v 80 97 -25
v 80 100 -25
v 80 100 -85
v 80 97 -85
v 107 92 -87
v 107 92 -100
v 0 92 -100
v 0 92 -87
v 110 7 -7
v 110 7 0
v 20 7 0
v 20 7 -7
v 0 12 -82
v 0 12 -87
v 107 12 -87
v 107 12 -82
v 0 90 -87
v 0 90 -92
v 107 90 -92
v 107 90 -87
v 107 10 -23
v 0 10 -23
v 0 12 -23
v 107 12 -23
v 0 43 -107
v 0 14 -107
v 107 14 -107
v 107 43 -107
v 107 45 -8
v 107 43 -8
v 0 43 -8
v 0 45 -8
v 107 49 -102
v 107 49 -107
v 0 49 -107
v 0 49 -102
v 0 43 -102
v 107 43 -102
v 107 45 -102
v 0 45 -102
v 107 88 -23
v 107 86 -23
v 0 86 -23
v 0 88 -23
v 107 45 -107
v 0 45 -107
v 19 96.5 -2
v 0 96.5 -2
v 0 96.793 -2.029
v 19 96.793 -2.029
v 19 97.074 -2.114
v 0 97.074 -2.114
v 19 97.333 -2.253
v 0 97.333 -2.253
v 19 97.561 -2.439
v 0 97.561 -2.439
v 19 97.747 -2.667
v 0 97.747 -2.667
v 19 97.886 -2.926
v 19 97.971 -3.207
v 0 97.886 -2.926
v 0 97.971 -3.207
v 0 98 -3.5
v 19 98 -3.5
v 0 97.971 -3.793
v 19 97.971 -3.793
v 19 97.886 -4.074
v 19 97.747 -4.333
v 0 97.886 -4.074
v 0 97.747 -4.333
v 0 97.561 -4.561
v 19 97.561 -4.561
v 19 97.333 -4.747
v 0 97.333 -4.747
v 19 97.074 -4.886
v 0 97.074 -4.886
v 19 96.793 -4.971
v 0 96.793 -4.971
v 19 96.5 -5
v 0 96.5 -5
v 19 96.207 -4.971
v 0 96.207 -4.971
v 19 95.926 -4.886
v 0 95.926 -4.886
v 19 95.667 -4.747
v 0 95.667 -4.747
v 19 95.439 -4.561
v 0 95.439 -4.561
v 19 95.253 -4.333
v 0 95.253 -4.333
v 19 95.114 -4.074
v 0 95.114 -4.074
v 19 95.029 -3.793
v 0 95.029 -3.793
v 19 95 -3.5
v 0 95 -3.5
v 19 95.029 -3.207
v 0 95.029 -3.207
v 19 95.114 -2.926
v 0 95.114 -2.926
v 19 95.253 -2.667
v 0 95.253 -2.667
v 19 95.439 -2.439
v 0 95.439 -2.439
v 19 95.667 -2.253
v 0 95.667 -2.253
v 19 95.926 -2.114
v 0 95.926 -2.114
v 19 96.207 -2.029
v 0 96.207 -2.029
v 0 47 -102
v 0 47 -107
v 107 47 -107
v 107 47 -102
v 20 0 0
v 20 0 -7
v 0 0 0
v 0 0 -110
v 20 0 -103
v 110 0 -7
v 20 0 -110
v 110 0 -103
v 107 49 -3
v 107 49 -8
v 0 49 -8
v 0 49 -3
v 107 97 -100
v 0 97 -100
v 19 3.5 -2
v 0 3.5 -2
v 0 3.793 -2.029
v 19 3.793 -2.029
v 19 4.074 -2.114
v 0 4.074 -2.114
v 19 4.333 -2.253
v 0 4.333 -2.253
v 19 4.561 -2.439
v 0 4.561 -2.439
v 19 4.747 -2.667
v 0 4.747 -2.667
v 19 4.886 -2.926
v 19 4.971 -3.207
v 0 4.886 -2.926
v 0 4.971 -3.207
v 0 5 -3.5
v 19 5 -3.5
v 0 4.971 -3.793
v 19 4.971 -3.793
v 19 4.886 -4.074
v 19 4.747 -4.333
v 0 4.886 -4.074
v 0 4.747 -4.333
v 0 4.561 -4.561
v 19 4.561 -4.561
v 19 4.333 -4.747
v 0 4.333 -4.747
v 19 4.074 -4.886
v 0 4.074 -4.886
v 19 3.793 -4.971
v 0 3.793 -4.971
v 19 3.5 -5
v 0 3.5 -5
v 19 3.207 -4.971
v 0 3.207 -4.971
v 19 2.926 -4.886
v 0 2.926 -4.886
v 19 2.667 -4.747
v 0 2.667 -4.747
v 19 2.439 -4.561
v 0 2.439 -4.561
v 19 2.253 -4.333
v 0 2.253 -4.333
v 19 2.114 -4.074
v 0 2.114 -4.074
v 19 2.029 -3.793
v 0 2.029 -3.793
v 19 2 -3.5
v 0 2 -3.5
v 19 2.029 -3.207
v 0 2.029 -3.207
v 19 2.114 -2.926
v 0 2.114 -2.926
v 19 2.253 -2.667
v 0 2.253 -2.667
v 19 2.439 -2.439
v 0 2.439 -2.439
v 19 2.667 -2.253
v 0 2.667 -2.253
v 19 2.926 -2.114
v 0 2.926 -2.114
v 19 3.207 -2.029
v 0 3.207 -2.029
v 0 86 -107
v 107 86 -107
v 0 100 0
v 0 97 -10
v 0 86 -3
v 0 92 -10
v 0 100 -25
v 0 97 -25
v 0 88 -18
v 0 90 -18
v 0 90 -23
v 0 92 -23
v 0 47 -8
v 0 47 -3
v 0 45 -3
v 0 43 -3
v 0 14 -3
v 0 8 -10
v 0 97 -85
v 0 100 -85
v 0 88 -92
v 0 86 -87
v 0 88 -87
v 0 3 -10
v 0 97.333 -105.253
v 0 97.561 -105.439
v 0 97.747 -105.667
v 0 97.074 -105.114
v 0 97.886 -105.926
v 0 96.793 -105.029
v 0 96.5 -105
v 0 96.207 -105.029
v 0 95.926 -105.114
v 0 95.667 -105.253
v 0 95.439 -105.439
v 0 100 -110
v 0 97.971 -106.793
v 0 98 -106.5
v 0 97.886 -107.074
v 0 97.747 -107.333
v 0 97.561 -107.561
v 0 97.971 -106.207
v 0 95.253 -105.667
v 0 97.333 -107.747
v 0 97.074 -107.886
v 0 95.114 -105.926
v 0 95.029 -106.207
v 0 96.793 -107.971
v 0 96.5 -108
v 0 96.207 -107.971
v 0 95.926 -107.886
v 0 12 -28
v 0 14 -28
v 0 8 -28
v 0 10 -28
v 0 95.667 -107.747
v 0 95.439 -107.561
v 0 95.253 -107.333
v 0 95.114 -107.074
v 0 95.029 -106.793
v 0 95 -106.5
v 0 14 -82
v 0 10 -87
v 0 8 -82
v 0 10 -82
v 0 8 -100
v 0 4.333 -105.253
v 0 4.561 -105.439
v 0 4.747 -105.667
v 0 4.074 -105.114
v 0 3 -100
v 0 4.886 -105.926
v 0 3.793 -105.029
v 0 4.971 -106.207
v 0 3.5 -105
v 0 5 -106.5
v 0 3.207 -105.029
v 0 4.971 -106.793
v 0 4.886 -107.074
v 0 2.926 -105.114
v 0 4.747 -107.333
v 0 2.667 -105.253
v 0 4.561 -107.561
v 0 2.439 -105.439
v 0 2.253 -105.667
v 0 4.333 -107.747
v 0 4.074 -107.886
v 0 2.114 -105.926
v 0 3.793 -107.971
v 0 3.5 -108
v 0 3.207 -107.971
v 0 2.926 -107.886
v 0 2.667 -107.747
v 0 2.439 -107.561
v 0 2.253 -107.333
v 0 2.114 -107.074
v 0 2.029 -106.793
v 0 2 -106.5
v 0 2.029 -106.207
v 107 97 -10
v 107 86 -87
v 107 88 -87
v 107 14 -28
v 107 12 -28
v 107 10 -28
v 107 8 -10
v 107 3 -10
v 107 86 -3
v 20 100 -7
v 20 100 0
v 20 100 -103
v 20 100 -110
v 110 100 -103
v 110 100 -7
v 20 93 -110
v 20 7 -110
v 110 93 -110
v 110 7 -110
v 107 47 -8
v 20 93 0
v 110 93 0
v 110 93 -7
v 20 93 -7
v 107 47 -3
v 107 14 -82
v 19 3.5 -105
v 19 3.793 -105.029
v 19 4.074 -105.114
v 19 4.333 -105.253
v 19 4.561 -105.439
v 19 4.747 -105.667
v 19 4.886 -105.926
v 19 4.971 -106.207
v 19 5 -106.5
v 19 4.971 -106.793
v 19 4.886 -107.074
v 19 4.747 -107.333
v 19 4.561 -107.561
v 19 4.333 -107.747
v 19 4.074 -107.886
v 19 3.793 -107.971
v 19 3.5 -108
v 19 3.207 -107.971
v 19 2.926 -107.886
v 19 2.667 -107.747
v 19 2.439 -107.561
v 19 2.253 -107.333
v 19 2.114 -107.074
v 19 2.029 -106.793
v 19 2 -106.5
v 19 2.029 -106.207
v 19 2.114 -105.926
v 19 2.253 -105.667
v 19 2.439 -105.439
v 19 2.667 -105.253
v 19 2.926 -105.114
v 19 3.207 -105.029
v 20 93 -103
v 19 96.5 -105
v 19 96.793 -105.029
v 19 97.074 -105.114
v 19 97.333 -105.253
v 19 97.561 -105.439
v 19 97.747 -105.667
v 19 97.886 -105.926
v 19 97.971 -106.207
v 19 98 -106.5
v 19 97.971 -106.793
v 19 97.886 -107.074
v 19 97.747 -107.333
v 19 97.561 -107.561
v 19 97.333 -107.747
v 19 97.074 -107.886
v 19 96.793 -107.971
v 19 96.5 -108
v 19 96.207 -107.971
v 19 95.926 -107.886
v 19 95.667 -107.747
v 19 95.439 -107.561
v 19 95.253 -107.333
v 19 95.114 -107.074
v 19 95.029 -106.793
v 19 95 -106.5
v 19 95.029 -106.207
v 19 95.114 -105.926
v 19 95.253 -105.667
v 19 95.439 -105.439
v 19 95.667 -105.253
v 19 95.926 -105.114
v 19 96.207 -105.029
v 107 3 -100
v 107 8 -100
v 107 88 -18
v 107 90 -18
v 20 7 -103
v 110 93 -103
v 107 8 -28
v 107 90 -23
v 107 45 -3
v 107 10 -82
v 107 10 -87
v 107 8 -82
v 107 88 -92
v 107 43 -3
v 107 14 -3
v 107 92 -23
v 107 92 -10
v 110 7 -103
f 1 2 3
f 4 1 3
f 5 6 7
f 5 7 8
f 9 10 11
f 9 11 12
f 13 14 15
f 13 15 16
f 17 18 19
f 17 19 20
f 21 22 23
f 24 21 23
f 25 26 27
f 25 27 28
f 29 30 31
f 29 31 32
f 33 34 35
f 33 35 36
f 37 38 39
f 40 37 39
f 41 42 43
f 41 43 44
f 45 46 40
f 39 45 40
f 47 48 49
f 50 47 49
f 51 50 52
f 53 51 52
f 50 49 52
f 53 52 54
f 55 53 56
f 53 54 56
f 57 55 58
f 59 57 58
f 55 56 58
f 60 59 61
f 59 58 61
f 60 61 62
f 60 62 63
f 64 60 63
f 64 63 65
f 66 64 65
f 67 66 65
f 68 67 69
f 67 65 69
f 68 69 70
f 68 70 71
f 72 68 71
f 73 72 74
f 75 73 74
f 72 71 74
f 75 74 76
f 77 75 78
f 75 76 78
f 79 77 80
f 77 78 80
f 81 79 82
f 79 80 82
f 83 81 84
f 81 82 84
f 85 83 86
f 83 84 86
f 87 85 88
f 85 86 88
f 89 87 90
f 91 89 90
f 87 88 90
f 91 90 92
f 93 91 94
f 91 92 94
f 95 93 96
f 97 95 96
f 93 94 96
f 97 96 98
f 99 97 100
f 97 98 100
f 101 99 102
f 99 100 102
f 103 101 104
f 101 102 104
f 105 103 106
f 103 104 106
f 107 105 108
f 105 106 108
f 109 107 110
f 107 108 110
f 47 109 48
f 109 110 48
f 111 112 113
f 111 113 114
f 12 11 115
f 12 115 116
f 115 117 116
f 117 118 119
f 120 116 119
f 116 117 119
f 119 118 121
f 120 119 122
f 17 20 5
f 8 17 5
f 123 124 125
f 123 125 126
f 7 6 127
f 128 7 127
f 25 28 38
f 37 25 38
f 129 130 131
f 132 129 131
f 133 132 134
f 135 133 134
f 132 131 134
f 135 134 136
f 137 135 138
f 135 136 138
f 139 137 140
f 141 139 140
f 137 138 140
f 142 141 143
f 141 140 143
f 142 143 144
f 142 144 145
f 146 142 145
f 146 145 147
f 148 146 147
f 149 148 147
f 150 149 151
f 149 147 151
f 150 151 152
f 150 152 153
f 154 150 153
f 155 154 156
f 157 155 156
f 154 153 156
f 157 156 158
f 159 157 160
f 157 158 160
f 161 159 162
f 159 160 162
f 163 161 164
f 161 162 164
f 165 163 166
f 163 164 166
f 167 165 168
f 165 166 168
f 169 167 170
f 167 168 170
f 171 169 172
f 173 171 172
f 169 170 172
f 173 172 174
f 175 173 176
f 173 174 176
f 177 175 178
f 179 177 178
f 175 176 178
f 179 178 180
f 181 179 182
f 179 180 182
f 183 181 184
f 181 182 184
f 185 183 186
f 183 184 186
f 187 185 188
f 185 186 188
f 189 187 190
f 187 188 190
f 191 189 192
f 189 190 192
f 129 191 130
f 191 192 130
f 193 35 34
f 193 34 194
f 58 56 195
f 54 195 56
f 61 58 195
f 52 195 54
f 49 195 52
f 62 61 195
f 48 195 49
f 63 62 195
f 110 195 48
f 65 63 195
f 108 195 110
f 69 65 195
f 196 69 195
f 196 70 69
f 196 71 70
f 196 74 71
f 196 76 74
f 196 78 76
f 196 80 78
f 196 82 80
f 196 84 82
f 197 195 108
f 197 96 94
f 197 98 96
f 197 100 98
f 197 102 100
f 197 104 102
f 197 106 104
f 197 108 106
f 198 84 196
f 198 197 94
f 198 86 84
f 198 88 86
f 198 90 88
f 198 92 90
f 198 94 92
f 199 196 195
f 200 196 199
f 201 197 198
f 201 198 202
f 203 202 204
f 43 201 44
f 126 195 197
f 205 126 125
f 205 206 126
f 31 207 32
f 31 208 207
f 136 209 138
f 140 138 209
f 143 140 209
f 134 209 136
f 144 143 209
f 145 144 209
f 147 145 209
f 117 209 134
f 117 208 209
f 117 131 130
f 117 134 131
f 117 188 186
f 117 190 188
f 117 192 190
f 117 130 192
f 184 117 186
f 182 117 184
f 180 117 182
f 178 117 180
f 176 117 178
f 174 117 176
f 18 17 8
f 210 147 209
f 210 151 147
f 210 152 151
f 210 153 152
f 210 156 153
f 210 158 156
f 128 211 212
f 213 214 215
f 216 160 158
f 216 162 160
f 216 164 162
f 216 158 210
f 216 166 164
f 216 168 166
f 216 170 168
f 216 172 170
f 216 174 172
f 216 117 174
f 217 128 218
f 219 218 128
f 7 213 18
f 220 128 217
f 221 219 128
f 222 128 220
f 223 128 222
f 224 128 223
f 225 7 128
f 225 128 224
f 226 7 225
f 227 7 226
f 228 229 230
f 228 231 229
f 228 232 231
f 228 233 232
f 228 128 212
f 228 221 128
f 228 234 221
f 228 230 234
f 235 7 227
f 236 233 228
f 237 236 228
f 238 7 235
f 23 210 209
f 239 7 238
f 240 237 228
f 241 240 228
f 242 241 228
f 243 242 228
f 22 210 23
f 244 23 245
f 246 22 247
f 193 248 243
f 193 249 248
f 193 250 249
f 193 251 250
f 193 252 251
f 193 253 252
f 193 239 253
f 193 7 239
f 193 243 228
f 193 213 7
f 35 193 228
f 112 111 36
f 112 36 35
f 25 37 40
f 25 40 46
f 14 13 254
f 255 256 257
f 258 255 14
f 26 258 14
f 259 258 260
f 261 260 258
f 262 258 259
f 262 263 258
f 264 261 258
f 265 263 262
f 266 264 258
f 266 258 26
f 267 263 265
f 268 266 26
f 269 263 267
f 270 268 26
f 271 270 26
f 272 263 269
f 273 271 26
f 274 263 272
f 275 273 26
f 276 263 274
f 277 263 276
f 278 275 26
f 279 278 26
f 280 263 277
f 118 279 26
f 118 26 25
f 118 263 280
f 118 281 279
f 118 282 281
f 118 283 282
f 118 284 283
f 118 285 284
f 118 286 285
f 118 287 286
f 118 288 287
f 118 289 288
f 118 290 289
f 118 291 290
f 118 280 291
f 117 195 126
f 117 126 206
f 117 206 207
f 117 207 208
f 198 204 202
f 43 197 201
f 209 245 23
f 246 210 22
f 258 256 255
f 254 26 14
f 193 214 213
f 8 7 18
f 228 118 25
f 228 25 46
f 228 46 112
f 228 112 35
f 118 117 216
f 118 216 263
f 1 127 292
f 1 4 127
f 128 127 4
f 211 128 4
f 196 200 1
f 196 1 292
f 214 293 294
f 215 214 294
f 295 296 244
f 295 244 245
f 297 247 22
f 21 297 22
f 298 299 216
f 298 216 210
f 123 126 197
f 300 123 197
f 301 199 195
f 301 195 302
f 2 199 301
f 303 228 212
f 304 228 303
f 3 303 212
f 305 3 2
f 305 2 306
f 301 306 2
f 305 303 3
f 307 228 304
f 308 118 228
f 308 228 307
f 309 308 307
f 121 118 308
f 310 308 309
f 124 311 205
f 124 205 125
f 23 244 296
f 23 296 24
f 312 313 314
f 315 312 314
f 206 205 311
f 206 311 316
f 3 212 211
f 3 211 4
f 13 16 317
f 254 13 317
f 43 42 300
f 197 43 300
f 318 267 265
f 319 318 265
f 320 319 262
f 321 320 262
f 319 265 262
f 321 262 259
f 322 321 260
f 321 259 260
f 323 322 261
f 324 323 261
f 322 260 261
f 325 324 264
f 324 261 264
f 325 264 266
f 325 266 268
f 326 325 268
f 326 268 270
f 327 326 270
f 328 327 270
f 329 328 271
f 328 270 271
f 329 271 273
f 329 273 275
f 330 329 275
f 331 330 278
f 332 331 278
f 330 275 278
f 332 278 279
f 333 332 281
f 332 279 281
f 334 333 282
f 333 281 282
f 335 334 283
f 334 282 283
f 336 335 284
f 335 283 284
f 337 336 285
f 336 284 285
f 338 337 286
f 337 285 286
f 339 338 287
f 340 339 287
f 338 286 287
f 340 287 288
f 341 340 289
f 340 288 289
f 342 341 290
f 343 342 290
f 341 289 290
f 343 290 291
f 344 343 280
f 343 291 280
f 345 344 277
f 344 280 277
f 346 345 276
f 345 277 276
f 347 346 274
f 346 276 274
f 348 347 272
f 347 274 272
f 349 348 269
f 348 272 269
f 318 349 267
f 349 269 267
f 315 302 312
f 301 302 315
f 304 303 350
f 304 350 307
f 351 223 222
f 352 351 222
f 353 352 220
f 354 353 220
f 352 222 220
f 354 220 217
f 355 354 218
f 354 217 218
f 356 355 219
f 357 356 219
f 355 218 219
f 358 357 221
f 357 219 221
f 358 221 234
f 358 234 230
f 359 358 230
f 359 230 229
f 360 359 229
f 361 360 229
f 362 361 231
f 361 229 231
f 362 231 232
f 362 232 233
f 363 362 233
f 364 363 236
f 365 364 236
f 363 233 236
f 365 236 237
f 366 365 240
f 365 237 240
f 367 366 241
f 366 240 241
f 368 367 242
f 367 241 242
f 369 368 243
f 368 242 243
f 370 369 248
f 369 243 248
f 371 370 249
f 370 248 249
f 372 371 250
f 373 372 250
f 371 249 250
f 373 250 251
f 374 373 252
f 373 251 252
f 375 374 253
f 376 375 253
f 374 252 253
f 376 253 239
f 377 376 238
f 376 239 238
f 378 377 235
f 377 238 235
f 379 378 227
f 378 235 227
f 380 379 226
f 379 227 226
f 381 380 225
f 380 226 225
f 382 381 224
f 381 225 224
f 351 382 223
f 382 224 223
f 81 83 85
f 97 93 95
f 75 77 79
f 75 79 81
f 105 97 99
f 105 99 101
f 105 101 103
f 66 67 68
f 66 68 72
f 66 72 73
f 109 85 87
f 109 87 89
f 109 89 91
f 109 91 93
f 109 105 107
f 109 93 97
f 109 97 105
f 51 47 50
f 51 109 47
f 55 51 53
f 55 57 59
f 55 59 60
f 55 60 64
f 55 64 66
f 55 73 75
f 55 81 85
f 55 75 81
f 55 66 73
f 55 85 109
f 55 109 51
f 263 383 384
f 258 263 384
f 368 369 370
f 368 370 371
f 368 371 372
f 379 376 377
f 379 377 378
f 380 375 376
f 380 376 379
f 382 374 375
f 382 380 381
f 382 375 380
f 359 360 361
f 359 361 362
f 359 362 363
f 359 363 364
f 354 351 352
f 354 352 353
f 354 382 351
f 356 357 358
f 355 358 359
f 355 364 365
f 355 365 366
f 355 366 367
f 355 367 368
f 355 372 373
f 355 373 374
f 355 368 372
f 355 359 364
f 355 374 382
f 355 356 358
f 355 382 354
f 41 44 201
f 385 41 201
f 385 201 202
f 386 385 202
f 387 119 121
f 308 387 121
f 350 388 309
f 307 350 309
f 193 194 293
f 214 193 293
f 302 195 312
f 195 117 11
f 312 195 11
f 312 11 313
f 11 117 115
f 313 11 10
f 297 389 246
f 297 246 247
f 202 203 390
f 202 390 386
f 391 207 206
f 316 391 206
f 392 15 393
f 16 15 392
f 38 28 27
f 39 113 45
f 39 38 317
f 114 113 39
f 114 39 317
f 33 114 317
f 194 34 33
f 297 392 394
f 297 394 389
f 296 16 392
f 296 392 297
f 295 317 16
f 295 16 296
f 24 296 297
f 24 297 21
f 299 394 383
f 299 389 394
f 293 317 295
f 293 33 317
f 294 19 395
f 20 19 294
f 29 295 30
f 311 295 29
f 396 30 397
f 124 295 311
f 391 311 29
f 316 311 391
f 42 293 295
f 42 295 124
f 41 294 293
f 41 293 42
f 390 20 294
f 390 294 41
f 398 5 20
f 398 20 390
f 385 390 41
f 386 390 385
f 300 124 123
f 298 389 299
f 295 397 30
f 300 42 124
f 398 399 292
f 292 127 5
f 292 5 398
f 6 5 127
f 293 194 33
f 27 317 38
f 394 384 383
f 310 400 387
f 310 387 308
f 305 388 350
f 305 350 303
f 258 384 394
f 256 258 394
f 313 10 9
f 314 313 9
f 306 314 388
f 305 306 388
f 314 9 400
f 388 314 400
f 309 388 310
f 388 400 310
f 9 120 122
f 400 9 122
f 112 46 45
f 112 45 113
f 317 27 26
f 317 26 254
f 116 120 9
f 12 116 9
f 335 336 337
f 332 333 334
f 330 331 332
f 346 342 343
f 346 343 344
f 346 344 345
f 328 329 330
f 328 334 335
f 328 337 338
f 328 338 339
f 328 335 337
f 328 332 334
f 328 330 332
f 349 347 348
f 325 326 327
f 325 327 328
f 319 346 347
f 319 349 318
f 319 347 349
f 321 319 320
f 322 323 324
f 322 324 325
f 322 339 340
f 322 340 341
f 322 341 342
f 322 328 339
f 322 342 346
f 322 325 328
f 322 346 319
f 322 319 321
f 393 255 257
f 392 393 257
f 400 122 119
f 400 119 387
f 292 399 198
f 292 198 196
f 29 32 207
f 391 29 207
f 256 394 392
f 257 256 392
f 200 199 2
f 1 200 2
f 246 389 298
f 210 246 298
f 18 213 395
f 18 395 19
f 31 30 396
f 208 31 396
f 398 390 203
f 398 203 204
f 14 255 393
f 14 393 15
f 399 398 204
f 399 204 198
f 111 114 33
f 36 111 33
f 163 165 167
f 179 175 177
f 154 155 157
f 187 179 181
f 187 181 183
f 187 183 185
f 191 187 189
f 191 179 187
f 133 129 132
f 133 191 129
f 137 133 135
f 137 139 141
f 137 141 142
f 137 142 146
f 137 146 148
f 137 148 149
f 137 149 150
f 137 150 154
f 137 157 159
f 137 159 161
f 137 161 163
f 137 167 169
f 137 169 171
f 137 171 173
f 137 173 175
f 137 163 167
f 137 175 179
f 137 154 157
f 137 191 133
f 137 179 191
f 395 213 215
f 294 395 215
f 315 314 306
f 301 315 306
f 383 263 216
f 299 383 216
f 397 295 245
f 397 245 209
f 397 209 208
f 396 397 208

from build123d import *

# Parameters (mm, degrees)
SKETCH2_W           = 110
SKETCH2_H           = 110
BOSS_EXTRUDE1_DEPTH = 100
SKETCH3_W           = 104
SKETCH3_H           = 94
CUT_EXTRUDE1_DEPTH  = 107
SKETCH4_W           = 80
SKETCH4_H           = 60
CUT_EXTRUDE2_DEPTH  = 10
SKETCH5_W           = 20
SKETCH5_H           = 6
BOSS_EXTRUDE2_DEPTH = 107
SKETCH6_W           = 5
SKETCH6_H           = 2
CUT_EXTRUDE3_DEPTH  = 107
SKETCH7_W           = 25
SKETCH7_H           = 6
SKETCH7_W_2         = 5
BOSS_EXTRUDE3_DEPTH = 107
SKETCH8_W           = 5
SKETCH8_H           = 2
CUT_EXTRUDE4_DEPTH  = 107
SKETCH9_W           = 10
SKETCH9_H           = 10
BOSS_EXTRUDE4_DEPTH = 110
SKETCH11_W          = 7
SKETCH11_H          = 7
CUT_EXTRUDE5_DEPTH  = 90
SKETCH13_R          = 1.5
CUT_EXTRUDE6_DEPTH  = 19


with BuildPart() as part:
    # Sketch2 → Boss-Extrude1 (new body)
    with BuildSketch(Plane(origin=(0, 0, 0), x_dir=(1, 0, 0), z_dir=(0, 1, 0))):
        with Locations((55, 55)):
            Rectangle(SKETCH2_W, SKETCH2_H)
    extrude(amount=BOSS_EXTRUDE1_DEPTH)

    # Sketch3 → Cut-Extrude1 (cut)
    with BuildSketch(Plane.ZY):
        with Locations((-55, 50)):
            Rectangle(SKETCH3_W, SKETCH3_H)
    extrude(amount=-CUT_EXTRUDE1_DEPTH, mode=Mode.SUBTRACT)

    # Sketch4 → Cut-Extrude2 (cut)
    with BuildSketch(Plane(origin=(0, 100, 0), x_dir=(1, 0, 0), z_dir=(0, 1, 0))):
        with Locations((40, 55)):
            Rectangle(SKETCH4_W, SKETCH4_H)
    extrude(amount=-CUT_EXTRUDE2_DEPTH, mode=Mode.SUBTRACT)

    # Sketch5 → Boss-Extrude2 (add)
    with BuildSketch(Plane.ZY.offset(-107)):
        with Locations((-97, 89)):
            Rectangle(SKETCH5_W, SKETCH5_H)
        with Locations((-13, 89)):
            Rectangle(SKETCH5_W, SKETCH5_H)
    extrude(amount=BOSS_EXTRUDE2_DEPTH)

    # Sketch6 → Cut-Extrude3 (cut)
    with BuildSketch(Plane.ZY):
        with Locations((-89.5, 89)):
            Rectangle(SKETCH6_W, SKETCH6_H)
        with Locations((-20.5, 89)):
            Rectangle(SKETCH6_W, SKETCH6_H)
    extrude(amount=-CUT_EXTRUDE3_DEPTH, mode=Mode.SUBTRACT)

    # Sketch7 → Boss-Extrude3 (add)
    with BuildSketch(Plane.ZY.offset(-107)):
        with Locations((-94.5, 11)):
            Rectangle(SKETCH7_W, SKETCH7_H)
        with Locations((-15.5, 11)):
            Rectangle(SKETCH7_W, SKETCH7_H)
        with Locations((-104.5, 46)):
            Rectangle(SKETCH7_W_2, SKETCH7_H)
        with Locations((-5.5, 46)):
            Rectangle(SKETCH7_W_2, SKETCH7_H)
    extrude(amount=BOSS_EXTRUDE3_DEPTH)

    # Sketch8 → Cut-Extrude4 (cut)
    with BuildSketch(Plane.ZY):
        with Locations((-5.5, 46)):
            Rectangle(SKETCH8_W, SKETCH8_H)
        with Locations((-84.5, 11)):
            Rectangle(SKETCH8_W, SKETCH8_H)
        with Locations((-25.5, 11)):
            Rectangle(SKETCH8_W, SKETCH8_H)
        with Locations((-104.5, 46)):
            Rectangle(SKETCH8_W, SKETCH8_H)
    extrude(amount=-CUT_EXTRUDE4_DEPTH, mode=Mode.SUBTRACT)

    # Sketch9 → Boss-Extrude4 (add)
    with BuildSketch(Plane(origin=(110, 0, 0), x_dir=(0, 0, -1), z_dir=(1, 0, 0))):
        with Locations((5, 5)):
            Rectangle(SKETCH9_W, SKETCH9_H)
        with Locations((105, 5)):
            Rectangle(SKETCH9_W, SKETCH9_H)
        with Locations((105, 95)):
            Rectangle(SKETCH9_W, SKETCH9_H)
        with Locations((5, 95)):
            Rectangle(SKETCH9_W, SKETCH9_H)
    extrude(amount=-BOSS_EXTRUDE4_DEPTH)

    # Sketch11 → Cut-Extrude5 (cut)
    with BuildSketch(Plane(origin=(110, 0, 0), x_dir=(0, 0, -1), z_dir=(1, 0, 0))):
        with Locations((3.5, 96.5)):
            Rectangle(SKETCH11_W, SKETCH11_H)
        with Locations((106.5, 96.5)):
            Rectangle(SKETCH11_W, SKETCH11_H)
        with Locations((3.5, 3.5)):
            Rectangle(SKETCH11_W, SKETCH11_H)
        with Locations((106.5, 3.5)):
            Rectangle(SKETCH11_W, SKETCH11_H)
    extrude(amount=-CUT_EXTRUDE5_DEPTH, mode=Mode.SUBTRACT)

    # Sketch13 → Cut-Extrude6 (cut)
    with BuildSketch(Plane.ZY):
        with Locations((-106.5, 3.5)):
            Circle(SKETCH13_R)
        with Locations((-3.5, 96.5)):
            Circle(SKETCH13_R)
        with Locations((-106.5, 96.5)):
            Circle(SKETCH13_R)
        with Locations((-3.5, 3.5)):
            Circle(SKETCH13_R)
    extrude(amount=-CUT_EXTRUDE6_DEPTH, mode=Mode.SUBTRACT)


solid = part.part
